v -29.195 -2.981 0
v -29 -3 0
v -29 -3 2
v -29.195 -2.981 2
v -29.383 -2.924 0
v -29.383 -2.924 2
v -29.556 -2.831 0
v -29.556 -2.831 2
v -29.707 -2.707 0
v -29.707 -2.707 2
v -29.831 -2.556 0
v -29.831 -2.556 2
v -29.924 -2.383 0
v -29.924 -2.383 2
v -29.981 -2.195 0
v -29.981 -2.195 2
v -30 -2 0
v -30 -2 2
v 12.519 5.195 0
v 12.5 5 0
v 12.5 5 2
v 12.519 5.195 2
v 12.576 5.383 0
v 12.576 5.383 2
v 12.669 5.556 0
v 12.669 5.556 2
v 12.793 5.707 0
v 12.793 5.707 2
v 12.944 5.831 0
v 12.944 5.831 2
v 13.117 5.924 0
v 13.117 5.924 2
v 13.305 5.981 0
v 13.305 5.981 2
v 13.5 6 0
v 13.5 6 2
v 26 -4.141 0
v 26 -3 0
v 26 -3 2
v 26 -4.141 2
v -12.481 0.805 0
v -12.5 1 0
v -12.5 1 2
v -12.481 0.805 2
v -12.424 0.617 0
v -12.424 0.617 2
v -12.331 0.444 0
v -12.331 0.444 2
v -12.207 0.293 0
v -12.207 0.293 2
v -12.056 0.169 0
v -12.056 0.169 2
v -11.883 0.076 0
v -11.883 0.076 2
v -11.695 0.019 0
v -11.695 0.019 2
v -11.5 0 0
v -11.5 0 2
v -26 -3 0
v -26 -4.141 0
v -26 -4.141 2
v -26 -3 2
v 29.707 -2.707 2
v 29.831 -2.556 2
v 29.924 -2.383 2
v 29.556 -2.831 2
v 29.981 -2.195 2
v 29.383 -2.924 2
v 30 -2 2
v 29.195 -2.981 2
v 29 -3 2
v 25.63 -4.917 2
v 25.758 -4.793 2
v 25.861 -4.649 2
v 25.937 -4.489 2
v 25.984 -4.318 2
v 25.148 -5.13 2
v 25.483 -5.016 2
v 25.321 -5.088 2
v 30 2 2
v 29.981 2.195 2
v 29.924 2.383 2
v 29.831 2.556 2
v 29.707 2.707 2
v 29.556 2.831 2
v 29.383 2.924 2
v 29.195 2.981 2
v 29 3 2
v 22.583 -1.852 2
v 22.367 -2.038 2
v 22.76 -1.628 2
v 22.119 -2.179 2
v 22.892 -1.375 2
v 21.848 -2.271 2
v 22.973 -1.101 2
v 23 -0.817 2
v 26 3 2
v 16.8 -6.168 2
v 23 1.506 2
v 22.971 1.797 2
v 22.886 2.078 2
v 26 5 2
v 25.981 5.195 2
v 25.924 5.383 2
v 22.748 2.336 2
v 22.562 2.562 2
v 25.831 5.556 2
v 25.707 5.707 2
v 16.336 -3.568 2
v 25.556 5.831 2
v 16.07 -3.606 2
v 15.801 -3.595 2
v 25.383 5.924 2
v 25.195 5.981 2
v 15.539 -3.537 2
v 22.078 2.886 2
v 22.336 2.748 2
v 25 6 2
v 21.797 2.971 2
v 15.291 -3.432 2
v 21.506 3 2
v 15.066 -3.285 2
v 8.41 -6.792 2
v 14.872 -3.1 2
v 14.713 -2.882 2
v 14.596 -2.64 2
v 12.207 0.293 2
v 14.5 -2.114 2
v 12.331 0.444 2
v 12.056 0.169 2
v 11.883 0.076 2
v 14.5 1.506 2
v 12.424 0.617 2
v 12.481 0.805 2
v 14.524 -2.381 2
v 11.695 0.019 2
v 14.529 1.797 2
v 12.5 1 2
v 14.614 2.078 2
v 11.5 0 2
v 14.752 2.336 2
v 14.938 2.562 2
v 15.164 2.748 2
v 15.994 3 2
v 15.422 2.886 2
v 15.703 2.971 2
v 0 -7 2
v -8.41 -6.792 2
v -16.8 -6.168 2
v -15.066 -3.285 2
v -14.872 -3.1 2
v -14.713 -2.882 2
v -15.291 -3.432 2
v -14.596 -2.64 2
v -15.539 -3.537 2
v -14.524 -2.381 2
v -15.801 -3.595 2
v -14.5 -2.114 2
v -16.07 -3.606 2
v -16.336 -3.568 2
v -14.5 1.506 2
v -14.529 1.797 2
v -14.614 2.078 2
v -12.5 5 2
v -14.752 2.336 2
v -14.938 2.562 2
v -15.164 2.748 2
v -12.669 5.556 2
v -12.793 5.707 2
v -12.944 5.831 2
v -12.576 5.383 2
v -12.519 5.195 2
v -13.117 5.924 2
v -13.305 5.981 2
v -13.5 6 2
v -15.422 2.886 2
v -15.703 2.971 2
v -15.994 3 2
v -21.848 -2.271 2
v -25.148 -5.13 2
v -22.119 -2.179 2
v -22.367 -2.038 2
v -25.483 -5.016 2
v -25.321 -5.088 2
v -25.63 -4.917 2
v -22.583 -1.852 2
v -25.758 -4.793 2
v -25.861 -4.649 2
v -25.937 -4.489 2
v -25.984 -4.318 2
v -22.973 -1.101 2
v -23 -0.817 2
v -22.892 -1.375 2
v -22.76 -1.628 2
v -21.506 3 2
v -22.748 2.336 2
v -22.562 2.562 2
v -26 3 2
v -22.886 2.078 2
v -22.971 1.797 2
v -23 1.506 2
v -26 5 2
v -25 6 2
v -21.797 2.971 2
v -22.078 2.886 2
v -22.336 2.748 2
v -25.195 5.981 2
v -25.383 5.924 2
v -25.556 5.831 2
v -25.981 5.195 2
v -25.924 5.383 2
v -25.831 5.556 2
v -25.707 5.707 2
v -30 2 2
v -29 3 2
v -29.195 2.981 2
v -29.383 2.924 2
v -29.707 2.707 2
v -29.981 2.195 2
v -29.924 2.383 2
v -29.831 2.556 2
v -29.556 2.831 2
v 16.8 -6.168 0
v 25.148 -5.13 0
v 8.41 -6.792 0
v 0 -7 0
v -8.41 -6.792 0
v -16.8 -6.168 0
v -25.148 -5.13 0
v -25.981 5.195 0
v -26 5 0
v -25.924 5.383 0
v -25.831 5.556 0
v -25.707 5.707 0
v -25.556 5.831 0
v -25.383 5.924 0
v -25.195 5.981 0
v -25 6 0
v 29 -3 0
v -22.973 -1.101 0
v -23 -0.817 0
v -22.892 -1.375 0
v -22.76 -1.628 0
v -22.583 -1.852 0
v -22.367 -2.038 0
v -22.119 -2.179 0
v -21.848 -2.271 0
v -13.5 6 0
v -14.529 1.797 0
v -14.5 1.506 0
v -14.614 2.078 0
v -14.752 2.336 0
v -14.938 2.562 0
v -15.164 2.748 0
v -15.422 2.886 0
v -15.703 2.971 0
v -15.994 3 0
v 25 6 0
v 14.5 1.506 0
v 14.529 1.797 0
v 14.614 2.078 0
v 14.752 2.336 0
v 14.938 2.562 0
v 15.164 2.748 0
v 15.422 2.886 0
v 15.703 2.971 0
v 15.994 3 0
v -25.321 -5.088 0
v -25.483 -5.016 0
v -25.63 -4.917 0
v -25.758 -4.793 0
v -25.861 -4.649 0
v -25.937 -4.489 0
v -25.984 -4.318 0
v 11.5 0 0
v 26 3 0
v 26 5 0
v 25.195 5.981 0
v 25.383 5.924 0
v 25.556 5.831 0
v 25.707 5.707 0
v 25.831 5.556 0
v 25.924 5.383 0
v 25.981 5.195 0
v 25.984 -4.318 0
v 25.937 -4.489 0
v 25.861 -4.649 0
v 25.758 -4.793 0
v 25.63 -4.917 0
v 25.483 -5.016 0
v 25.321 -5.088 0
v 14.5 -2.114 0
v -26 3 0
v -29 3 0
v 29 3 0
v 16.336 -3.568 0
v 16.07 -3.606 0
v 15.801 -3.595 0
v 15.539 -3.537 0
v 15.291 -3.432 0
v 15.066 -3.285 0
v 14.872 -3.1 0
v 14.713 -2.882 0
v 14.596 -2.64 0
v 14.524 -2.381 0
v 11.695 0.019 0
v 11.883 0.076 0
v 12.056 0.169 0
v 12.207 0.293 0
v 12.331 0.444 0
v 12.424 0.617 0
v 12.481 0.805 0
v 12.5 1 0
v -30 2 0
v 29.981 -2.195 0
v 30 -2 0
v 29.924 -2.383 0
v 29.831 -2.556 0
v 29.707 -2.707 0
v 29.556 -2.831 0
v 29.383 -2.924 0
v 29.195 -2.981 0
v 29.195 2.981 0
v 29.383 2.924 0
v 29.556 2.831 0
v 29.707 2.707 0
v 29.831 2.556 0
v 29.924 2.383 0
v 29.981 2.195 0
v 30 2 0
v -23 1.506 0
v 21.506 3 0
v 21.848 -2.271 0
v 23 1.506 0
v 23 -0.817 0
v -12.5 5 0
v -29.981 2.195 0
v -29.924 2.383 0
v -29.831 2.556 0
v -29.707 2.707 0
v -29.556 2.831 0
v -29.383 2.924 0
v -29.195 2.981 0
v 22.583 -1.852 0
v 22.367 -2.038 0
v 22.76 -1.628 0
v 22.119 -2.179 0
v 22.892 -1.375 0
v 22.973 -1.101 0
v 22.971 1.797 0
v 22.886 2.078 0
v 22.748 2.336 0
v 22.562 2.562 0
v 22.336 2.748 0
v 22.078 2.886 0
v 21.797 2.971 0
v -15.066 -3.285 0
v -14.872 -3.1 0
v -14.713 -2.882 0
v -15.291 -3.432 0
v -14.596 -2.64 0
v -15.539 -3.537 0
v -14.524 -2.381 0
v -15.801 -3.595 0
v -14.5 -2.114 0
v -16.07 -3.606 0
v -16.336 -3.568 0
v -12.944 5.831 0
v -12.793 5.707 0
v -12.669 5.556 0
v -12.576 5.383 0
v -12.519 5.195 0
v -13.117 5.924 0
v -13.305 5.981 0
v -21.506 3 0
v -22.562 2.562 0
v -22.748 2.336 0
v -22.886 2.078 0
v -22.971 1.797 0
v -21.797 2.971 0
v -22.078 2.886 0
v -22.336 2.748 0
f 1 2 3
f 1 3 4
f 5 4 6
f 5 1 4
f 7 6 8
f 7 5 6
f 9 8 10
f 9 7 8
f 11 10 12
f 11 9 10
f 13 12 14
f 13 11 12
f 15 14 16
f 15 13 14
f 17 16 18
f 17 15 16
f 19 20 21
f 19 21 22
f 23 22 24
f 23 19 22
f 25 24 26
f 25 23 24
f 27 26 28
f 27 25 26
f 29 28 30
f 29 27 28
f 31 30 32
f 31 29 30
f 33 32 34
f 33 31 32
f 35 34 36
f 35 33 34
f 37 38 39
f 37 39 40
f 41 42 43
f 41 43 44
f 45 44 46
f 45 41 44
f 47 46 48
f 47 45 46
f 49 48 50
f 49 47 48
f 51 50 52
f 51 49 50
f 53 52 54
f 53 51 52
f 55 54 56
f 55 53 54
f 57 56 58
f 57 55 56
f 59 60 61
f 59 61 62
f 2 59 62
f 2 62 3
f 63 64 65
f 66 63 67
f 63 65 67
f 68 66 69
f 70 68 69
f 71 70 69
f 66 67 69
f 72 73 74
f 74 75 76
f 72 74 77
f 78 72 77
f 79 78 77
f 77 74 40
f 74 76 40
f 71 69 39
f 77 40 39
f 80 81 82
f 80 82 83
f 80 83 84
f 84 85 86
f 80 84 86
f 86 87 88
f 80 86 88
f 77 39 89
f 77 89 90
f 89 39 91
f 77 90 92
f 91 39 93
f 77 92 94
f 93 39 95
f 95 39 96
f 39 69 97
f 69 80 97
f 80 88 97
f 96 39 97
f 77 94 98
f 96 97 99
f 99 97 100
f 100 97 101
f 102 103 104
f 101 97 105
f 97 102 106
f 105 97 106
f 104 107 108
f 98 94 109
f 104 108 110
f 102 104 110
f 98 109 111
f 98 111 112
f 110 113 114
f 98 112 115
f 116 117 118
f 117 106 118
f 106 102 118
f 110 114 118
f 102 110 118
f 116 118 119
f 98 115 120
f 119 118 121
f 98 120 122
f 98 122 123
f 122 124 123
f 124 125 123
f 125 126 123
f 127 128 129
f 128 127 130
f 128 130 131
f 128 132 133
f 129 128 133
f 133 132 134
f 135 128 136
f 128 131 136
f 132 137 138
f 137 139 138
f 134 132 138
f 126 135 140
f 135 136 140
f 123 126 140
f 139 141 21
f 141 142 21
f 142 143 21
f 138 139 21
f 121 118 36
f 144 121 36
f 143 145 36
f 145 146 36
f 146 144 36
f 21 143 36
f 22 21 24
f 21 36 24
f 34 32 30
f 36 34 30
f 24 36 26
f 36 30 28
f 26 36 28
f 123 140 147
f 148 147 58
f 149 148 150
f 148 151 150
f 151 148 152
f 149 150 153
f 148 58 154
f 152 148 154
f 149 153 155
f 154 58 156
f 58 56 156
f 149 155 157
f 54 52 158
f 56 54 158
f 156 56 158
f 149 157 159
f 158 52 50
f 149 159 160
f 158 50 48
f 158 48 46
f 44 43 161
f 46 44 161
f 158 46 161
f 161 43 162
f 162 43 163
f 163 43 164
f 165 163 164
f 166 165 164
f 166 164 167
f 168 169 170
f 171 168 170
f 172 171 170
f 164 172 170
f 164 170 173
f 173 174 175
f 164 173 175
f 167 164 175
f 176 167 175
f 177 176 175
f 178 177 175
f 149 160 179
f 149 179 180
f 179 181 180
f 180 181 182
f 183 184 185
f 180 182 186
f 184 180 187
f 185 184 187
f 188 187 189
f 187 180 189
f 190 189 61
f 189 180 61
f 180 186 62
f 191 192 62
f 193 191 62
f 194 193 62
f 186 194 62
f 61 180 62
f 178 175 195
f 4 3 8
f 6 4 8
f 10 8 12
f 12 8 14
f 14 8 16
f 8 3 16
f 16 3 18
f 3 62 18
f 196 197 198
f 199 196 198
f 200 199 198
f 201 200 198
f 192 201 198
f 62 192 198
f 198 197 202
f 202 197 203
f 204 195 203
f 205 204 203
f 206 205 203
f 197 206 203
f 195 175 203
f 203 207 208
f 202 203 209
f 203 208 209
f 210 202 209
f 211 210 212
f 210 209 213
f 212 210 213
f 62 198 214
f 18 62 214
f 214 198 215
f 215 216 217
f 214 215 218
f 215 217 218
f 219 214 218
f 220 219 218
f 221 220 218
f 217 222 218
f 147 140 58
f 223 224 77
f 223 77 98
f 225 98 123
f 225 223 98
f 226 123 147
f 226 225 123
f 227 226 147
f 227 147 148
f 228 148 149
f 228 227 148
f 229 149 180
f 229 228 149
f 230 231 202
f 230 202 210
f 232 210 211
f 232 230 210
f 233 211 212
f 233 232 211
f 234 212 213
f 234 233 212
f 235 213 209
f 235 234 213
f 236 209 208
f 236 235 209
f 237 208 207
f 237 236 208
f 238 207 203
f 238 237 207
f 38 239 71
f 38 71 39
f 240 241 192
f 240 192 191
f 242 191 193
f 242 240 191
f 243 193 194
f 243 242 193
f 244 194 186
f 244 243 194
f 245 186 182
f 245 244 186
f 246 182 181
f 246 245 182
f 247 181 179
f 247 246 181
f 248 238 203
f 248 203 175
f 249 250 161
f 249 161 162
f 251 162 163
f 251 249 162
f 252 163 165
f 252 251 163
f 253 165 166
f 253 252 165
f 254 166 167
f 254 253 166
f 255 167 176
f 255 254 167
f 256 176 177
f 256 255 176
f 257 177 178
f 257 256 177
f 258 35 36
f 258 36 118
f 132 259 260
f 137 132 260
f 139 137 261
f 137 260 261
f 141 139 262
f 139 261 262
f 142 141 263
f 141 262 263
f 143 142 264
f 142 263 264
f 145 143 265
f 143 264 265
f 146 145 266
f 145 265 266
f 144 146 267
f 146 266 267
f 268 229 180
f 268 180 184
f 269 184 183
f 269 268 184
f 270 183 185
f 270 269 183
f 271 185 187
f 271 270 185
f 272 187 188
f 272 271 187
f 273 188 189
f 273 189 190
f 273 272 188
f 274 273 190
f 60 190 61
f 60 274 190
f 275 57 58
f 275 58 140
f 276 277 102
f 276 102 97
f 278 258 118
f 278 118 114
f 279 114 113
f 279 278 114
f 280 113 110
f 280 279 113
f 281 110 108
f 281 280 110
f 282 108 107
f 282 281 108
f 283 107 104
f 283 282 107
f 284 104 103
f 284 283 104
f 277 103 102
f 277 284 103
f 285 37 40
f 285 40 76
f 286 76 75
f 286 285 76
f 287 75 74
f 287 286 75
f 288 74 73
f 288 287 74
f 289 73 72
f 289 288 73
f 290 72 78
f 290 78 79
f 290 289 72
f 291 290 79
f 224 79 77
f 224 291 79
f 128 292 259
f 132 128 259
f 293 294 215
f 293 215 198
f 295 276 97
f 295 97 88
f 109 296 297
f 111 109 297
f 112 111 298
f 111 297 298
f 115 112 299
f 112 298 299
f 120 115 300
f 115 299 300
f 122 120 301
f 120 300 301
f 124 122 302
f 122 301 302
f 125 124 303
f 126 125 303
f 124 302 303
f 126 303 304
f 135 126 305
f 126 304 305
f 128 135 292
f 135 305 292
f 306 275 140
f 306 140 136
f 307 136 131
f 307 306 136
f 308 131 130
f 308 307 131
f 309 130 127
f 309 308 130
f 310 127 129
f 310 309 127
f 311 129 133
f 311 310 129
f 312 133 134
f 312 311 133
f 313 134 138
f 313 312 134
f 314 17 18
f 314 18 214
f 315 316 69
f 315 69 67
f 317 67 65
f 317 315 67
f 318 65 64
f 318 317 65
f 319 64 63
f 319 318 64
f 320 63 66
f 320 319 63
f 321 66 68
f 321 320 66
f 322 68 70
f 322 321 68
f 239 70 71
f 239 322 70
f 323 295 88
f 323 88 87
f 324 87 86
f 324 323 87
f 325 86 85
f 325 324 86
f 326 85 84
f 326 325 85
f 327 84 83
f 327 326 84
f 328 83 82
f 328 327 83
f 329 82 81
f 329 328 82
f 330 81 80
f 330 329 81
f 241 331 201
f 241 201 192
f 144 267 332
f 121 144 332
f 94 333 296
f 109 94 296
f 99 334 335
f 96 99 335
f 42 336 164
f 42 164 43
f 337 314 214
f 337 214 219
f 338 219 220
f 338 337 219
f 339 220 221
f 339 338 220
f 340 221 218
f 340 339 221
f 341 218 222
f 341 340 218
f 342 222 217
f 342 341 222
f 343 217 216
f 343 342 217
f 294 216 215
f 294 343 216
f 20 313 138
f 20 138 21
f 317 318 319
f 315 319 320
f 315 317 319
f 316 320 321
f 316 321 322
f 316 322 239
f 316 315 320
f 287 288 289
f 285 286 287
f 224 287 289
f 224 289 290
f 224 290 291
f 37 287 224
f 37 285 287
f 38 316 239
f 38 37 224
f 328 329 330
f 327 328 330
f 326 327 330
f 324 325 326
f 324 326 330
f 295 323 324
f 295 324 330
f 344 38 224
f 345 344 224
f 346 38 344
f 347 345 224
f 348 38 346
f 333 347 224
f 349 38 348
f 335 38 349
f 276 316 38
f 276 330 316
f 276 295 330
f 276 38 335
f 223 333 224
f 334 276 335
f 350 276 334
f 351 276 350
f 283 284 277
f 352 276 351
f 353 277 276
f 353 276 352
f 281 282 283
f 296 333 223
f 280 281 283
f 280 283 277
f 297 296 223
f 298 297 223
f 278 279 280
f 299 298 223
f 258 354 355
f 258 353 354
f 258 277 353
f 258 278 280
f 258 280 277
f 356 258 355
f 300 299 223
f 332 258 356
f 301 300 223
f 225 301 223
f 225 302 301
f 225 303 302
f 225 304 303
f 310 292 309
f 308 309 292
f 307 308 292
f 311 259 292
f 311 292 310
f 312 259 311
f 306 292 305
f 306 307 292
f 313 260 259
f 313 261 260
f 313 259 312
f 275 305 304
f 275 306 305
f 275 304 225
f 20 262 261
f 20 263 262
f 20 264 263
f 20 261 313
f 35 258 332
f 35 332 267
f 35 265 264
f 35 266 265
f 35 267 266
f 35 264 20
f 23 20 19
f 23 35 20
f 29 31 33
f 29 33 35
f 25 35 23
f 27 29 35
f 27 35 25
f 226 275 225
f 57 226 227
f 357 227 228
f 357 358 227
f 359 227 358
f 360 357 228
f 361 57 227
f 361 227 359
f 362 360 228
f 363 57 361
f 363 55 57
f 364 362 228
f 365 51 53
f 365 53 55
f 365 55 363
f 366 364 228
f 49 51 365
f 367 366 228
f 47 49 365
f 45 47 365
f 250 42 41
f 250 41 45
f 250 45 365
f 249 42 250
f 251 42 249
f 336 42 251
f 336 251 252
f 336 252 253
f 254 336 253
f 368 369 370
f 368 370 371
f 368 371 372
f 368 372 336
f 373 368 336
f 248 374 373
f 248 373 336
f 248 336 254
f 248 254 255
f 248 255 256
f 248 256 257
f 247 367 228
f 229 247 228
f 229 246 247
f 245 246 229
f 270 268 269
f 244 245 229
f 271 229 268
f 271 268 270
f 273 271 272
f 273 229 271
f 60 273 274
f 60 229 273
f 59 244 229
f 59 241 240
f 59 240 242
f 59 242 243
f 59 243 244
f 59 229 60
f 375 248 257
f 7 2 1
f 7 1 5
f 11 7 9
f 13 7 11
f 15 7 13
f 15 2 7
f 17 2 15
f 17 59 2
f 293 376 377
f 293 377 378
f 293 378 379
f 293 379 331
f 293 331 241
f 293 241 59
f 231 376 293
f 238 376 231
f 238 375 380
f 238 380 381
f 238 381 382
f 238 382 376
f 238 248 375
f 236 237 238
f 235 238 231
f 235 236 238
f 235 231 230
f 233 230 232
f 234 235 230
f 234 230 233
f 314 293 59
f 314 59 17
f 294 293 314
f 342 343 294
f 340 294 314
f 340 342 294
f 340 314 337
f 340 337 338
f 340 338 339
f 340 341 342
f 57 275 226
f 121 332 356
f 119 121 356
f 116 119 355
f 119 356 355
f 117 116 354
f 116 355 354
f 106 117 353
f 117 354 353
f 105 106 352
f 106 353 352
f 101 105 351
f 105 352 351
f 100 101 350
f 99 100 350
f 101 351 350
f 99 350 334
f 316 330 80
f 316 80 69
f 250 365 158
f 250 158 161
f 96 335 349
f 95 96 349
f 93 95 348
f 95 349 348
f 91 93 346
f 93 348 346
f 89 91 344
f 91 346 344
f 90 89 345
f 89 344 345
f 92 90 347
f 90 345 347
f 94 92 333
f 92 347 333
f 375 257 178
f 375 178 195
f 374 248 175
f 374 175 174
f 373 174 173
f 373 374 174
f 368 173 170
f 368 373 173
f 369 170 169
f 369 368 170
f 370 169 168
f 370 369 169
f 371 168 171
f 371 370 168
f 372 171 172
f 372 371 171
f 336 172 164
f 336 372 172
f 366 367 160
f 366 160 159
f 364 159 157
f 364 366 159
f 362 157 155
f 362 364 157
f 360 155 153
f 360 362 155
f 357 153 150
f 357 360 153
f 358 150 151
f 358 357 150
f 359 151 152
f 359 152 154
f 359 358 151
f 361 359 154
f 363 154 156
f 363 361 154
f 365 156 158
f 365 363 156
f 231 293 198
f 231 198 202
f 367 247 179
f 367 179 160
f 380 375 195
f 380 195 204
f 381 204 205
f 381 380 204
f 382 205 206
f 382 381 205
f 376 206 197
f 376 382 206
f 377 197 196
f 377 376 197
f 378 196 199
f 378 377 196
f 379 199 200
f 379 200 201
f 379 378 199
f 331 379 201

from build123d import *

# Parameters (mm, degrees)
RESSALTO_EXTRUS_O1_DEPTH = 2


with BuildPart() as part:
    # Esboço1 → Ressalto-extrusão1 (new body)
    with BuildSketch(Plane.XY):
        with BuildLine():
            Line((-11.5, 0), (11.5, 0))
            ThreePointArc((11.5, 0), (12.207106781, 0.292893219), (12.5, 1))
            Line((12.5, 1), (12.5, 5))
            ThreePointArc((12.5, 5), (12.792893219, 5.707106781), (13.5, 6))
            Line((13.5, 6), (25, 6))
            ThreePointArc((25, 6), (25.707106781, 5.707106781), (26, 5))
            Line((26, 5), (26, 3))
            Line((26, 3), (29, 3))
            ThreePointArc((29, 3), (29.707106781, 2.707106781), (30, 2))
            Line((30, 2), (30, -2))
            ThreePointArc((30, -2), (29.707106781, -2.707106781), (29, -3))
            Line((29, -3), (26, -3))
            Line((26, -3), (26, -4.140659326))
            ThreePointArc((26, -4.140659326), (25.757604446, -4.793373278), (25.147928994, -5.12965731))
            ThreePointArc((25.147928994, -5.12965731), (12.608692582, -6.531769505), (0, -7))
            ThreePointArc((0, -7), (-12.608692582, -6.531769505), (-25.147928994, -5.12965731))
            ThreePointArc((-25.147928994, -5.12965731), (-25.757604446, -4.793373278), (-26, -4.140659326))
            Line((-26, -4.140659326), (-26, -3))
            Line((-26, -3), (-29, -3))
            ThreePointArc((-29, -3), (-29.707106781, -2.707106781), (-30, -2))
            Line((-30, -2), (-30, 2))
            ThreePointArc((-30, 2), (-29.707106781, 2.707106781), (-29, 3))
            Line((-29, 3), (-26, 3))
            Line((-26, 3), (-26, 5))
            ThreePointArc((-26, 5), (-25.707106781, 5.707106781), (-25, 6))
            Line((-25, 6), (-13.5, 6))
            ThreePointArc((-13.5, 6), (-12.792893219, 5.707106781), (-12.5, 5))
            Line((-12.5, 5), (-12.5, 1))
            ThreePointArc((-12.5, 1), (-12.207106781, 0.292893219), (-11.5, 0))
        make_face()
        with BuildLine():
            Line((15.99403097, 3), (21.50596903, 3))
            ThreePointArc((21.50596903, 3), (22.56240846, 2.56240846), (23, 1.50596903))
            Line((23, 1.50596903), (23, -0.816705571))
            ThreePointArc((23, -0.816705571), (22.677159402, -1.744305514), (21.848160888, -2.271020968))
            Line((21.848160888, -2.271020968), (16.336222828, -3.56794757))
            ThreePointArc((16.336222828, -3.56794757), (15.066431028, -3.284822545), (14.5, -2.113632174))
            Line((14.5, -2.113632174), (14.5, 1.50596903))
            ThreePointArc((14.5, 1.50596903), (14.93759154, 2.56240846), (15.99403097, 3))
        make_face(mode=Mode.SUBTRACT)
        with BuildLine():
            Line((-14.5, -2.113632174), (-14.5, 1.50596903))
            ThreePointArc((-14.5, 1.50596903), (-14.93759154, 2.56240846), (-15.99403097, 3))
            Line((-15.99403097, 3), (-21.50596903, 3))
            ThreePointArc((-21.50596903, 3), (-22.56240846, 2.56240846), (-23, 1.50596903))
            Line((-23, 1.50596903), (-23, -0.816705571))
            ThreePointArc((-23, -0.816705571), (-22.677159402, -1.744305514), (-21.848160888, -2.271020968))
            Line((-21.848160888, -2.271020968), (-16.336222828, -3.56794757))
            ThreePointArc((-16.336222828, -3.56794757), (-15.066431028, -3.284822545), (-14.5, -2.113632174))
        make_face(mode=Mode.SUBTRACT)
    extrude(amount=RESSALTO_EXTRUS_O1_DEPTH)


solid = part.part
